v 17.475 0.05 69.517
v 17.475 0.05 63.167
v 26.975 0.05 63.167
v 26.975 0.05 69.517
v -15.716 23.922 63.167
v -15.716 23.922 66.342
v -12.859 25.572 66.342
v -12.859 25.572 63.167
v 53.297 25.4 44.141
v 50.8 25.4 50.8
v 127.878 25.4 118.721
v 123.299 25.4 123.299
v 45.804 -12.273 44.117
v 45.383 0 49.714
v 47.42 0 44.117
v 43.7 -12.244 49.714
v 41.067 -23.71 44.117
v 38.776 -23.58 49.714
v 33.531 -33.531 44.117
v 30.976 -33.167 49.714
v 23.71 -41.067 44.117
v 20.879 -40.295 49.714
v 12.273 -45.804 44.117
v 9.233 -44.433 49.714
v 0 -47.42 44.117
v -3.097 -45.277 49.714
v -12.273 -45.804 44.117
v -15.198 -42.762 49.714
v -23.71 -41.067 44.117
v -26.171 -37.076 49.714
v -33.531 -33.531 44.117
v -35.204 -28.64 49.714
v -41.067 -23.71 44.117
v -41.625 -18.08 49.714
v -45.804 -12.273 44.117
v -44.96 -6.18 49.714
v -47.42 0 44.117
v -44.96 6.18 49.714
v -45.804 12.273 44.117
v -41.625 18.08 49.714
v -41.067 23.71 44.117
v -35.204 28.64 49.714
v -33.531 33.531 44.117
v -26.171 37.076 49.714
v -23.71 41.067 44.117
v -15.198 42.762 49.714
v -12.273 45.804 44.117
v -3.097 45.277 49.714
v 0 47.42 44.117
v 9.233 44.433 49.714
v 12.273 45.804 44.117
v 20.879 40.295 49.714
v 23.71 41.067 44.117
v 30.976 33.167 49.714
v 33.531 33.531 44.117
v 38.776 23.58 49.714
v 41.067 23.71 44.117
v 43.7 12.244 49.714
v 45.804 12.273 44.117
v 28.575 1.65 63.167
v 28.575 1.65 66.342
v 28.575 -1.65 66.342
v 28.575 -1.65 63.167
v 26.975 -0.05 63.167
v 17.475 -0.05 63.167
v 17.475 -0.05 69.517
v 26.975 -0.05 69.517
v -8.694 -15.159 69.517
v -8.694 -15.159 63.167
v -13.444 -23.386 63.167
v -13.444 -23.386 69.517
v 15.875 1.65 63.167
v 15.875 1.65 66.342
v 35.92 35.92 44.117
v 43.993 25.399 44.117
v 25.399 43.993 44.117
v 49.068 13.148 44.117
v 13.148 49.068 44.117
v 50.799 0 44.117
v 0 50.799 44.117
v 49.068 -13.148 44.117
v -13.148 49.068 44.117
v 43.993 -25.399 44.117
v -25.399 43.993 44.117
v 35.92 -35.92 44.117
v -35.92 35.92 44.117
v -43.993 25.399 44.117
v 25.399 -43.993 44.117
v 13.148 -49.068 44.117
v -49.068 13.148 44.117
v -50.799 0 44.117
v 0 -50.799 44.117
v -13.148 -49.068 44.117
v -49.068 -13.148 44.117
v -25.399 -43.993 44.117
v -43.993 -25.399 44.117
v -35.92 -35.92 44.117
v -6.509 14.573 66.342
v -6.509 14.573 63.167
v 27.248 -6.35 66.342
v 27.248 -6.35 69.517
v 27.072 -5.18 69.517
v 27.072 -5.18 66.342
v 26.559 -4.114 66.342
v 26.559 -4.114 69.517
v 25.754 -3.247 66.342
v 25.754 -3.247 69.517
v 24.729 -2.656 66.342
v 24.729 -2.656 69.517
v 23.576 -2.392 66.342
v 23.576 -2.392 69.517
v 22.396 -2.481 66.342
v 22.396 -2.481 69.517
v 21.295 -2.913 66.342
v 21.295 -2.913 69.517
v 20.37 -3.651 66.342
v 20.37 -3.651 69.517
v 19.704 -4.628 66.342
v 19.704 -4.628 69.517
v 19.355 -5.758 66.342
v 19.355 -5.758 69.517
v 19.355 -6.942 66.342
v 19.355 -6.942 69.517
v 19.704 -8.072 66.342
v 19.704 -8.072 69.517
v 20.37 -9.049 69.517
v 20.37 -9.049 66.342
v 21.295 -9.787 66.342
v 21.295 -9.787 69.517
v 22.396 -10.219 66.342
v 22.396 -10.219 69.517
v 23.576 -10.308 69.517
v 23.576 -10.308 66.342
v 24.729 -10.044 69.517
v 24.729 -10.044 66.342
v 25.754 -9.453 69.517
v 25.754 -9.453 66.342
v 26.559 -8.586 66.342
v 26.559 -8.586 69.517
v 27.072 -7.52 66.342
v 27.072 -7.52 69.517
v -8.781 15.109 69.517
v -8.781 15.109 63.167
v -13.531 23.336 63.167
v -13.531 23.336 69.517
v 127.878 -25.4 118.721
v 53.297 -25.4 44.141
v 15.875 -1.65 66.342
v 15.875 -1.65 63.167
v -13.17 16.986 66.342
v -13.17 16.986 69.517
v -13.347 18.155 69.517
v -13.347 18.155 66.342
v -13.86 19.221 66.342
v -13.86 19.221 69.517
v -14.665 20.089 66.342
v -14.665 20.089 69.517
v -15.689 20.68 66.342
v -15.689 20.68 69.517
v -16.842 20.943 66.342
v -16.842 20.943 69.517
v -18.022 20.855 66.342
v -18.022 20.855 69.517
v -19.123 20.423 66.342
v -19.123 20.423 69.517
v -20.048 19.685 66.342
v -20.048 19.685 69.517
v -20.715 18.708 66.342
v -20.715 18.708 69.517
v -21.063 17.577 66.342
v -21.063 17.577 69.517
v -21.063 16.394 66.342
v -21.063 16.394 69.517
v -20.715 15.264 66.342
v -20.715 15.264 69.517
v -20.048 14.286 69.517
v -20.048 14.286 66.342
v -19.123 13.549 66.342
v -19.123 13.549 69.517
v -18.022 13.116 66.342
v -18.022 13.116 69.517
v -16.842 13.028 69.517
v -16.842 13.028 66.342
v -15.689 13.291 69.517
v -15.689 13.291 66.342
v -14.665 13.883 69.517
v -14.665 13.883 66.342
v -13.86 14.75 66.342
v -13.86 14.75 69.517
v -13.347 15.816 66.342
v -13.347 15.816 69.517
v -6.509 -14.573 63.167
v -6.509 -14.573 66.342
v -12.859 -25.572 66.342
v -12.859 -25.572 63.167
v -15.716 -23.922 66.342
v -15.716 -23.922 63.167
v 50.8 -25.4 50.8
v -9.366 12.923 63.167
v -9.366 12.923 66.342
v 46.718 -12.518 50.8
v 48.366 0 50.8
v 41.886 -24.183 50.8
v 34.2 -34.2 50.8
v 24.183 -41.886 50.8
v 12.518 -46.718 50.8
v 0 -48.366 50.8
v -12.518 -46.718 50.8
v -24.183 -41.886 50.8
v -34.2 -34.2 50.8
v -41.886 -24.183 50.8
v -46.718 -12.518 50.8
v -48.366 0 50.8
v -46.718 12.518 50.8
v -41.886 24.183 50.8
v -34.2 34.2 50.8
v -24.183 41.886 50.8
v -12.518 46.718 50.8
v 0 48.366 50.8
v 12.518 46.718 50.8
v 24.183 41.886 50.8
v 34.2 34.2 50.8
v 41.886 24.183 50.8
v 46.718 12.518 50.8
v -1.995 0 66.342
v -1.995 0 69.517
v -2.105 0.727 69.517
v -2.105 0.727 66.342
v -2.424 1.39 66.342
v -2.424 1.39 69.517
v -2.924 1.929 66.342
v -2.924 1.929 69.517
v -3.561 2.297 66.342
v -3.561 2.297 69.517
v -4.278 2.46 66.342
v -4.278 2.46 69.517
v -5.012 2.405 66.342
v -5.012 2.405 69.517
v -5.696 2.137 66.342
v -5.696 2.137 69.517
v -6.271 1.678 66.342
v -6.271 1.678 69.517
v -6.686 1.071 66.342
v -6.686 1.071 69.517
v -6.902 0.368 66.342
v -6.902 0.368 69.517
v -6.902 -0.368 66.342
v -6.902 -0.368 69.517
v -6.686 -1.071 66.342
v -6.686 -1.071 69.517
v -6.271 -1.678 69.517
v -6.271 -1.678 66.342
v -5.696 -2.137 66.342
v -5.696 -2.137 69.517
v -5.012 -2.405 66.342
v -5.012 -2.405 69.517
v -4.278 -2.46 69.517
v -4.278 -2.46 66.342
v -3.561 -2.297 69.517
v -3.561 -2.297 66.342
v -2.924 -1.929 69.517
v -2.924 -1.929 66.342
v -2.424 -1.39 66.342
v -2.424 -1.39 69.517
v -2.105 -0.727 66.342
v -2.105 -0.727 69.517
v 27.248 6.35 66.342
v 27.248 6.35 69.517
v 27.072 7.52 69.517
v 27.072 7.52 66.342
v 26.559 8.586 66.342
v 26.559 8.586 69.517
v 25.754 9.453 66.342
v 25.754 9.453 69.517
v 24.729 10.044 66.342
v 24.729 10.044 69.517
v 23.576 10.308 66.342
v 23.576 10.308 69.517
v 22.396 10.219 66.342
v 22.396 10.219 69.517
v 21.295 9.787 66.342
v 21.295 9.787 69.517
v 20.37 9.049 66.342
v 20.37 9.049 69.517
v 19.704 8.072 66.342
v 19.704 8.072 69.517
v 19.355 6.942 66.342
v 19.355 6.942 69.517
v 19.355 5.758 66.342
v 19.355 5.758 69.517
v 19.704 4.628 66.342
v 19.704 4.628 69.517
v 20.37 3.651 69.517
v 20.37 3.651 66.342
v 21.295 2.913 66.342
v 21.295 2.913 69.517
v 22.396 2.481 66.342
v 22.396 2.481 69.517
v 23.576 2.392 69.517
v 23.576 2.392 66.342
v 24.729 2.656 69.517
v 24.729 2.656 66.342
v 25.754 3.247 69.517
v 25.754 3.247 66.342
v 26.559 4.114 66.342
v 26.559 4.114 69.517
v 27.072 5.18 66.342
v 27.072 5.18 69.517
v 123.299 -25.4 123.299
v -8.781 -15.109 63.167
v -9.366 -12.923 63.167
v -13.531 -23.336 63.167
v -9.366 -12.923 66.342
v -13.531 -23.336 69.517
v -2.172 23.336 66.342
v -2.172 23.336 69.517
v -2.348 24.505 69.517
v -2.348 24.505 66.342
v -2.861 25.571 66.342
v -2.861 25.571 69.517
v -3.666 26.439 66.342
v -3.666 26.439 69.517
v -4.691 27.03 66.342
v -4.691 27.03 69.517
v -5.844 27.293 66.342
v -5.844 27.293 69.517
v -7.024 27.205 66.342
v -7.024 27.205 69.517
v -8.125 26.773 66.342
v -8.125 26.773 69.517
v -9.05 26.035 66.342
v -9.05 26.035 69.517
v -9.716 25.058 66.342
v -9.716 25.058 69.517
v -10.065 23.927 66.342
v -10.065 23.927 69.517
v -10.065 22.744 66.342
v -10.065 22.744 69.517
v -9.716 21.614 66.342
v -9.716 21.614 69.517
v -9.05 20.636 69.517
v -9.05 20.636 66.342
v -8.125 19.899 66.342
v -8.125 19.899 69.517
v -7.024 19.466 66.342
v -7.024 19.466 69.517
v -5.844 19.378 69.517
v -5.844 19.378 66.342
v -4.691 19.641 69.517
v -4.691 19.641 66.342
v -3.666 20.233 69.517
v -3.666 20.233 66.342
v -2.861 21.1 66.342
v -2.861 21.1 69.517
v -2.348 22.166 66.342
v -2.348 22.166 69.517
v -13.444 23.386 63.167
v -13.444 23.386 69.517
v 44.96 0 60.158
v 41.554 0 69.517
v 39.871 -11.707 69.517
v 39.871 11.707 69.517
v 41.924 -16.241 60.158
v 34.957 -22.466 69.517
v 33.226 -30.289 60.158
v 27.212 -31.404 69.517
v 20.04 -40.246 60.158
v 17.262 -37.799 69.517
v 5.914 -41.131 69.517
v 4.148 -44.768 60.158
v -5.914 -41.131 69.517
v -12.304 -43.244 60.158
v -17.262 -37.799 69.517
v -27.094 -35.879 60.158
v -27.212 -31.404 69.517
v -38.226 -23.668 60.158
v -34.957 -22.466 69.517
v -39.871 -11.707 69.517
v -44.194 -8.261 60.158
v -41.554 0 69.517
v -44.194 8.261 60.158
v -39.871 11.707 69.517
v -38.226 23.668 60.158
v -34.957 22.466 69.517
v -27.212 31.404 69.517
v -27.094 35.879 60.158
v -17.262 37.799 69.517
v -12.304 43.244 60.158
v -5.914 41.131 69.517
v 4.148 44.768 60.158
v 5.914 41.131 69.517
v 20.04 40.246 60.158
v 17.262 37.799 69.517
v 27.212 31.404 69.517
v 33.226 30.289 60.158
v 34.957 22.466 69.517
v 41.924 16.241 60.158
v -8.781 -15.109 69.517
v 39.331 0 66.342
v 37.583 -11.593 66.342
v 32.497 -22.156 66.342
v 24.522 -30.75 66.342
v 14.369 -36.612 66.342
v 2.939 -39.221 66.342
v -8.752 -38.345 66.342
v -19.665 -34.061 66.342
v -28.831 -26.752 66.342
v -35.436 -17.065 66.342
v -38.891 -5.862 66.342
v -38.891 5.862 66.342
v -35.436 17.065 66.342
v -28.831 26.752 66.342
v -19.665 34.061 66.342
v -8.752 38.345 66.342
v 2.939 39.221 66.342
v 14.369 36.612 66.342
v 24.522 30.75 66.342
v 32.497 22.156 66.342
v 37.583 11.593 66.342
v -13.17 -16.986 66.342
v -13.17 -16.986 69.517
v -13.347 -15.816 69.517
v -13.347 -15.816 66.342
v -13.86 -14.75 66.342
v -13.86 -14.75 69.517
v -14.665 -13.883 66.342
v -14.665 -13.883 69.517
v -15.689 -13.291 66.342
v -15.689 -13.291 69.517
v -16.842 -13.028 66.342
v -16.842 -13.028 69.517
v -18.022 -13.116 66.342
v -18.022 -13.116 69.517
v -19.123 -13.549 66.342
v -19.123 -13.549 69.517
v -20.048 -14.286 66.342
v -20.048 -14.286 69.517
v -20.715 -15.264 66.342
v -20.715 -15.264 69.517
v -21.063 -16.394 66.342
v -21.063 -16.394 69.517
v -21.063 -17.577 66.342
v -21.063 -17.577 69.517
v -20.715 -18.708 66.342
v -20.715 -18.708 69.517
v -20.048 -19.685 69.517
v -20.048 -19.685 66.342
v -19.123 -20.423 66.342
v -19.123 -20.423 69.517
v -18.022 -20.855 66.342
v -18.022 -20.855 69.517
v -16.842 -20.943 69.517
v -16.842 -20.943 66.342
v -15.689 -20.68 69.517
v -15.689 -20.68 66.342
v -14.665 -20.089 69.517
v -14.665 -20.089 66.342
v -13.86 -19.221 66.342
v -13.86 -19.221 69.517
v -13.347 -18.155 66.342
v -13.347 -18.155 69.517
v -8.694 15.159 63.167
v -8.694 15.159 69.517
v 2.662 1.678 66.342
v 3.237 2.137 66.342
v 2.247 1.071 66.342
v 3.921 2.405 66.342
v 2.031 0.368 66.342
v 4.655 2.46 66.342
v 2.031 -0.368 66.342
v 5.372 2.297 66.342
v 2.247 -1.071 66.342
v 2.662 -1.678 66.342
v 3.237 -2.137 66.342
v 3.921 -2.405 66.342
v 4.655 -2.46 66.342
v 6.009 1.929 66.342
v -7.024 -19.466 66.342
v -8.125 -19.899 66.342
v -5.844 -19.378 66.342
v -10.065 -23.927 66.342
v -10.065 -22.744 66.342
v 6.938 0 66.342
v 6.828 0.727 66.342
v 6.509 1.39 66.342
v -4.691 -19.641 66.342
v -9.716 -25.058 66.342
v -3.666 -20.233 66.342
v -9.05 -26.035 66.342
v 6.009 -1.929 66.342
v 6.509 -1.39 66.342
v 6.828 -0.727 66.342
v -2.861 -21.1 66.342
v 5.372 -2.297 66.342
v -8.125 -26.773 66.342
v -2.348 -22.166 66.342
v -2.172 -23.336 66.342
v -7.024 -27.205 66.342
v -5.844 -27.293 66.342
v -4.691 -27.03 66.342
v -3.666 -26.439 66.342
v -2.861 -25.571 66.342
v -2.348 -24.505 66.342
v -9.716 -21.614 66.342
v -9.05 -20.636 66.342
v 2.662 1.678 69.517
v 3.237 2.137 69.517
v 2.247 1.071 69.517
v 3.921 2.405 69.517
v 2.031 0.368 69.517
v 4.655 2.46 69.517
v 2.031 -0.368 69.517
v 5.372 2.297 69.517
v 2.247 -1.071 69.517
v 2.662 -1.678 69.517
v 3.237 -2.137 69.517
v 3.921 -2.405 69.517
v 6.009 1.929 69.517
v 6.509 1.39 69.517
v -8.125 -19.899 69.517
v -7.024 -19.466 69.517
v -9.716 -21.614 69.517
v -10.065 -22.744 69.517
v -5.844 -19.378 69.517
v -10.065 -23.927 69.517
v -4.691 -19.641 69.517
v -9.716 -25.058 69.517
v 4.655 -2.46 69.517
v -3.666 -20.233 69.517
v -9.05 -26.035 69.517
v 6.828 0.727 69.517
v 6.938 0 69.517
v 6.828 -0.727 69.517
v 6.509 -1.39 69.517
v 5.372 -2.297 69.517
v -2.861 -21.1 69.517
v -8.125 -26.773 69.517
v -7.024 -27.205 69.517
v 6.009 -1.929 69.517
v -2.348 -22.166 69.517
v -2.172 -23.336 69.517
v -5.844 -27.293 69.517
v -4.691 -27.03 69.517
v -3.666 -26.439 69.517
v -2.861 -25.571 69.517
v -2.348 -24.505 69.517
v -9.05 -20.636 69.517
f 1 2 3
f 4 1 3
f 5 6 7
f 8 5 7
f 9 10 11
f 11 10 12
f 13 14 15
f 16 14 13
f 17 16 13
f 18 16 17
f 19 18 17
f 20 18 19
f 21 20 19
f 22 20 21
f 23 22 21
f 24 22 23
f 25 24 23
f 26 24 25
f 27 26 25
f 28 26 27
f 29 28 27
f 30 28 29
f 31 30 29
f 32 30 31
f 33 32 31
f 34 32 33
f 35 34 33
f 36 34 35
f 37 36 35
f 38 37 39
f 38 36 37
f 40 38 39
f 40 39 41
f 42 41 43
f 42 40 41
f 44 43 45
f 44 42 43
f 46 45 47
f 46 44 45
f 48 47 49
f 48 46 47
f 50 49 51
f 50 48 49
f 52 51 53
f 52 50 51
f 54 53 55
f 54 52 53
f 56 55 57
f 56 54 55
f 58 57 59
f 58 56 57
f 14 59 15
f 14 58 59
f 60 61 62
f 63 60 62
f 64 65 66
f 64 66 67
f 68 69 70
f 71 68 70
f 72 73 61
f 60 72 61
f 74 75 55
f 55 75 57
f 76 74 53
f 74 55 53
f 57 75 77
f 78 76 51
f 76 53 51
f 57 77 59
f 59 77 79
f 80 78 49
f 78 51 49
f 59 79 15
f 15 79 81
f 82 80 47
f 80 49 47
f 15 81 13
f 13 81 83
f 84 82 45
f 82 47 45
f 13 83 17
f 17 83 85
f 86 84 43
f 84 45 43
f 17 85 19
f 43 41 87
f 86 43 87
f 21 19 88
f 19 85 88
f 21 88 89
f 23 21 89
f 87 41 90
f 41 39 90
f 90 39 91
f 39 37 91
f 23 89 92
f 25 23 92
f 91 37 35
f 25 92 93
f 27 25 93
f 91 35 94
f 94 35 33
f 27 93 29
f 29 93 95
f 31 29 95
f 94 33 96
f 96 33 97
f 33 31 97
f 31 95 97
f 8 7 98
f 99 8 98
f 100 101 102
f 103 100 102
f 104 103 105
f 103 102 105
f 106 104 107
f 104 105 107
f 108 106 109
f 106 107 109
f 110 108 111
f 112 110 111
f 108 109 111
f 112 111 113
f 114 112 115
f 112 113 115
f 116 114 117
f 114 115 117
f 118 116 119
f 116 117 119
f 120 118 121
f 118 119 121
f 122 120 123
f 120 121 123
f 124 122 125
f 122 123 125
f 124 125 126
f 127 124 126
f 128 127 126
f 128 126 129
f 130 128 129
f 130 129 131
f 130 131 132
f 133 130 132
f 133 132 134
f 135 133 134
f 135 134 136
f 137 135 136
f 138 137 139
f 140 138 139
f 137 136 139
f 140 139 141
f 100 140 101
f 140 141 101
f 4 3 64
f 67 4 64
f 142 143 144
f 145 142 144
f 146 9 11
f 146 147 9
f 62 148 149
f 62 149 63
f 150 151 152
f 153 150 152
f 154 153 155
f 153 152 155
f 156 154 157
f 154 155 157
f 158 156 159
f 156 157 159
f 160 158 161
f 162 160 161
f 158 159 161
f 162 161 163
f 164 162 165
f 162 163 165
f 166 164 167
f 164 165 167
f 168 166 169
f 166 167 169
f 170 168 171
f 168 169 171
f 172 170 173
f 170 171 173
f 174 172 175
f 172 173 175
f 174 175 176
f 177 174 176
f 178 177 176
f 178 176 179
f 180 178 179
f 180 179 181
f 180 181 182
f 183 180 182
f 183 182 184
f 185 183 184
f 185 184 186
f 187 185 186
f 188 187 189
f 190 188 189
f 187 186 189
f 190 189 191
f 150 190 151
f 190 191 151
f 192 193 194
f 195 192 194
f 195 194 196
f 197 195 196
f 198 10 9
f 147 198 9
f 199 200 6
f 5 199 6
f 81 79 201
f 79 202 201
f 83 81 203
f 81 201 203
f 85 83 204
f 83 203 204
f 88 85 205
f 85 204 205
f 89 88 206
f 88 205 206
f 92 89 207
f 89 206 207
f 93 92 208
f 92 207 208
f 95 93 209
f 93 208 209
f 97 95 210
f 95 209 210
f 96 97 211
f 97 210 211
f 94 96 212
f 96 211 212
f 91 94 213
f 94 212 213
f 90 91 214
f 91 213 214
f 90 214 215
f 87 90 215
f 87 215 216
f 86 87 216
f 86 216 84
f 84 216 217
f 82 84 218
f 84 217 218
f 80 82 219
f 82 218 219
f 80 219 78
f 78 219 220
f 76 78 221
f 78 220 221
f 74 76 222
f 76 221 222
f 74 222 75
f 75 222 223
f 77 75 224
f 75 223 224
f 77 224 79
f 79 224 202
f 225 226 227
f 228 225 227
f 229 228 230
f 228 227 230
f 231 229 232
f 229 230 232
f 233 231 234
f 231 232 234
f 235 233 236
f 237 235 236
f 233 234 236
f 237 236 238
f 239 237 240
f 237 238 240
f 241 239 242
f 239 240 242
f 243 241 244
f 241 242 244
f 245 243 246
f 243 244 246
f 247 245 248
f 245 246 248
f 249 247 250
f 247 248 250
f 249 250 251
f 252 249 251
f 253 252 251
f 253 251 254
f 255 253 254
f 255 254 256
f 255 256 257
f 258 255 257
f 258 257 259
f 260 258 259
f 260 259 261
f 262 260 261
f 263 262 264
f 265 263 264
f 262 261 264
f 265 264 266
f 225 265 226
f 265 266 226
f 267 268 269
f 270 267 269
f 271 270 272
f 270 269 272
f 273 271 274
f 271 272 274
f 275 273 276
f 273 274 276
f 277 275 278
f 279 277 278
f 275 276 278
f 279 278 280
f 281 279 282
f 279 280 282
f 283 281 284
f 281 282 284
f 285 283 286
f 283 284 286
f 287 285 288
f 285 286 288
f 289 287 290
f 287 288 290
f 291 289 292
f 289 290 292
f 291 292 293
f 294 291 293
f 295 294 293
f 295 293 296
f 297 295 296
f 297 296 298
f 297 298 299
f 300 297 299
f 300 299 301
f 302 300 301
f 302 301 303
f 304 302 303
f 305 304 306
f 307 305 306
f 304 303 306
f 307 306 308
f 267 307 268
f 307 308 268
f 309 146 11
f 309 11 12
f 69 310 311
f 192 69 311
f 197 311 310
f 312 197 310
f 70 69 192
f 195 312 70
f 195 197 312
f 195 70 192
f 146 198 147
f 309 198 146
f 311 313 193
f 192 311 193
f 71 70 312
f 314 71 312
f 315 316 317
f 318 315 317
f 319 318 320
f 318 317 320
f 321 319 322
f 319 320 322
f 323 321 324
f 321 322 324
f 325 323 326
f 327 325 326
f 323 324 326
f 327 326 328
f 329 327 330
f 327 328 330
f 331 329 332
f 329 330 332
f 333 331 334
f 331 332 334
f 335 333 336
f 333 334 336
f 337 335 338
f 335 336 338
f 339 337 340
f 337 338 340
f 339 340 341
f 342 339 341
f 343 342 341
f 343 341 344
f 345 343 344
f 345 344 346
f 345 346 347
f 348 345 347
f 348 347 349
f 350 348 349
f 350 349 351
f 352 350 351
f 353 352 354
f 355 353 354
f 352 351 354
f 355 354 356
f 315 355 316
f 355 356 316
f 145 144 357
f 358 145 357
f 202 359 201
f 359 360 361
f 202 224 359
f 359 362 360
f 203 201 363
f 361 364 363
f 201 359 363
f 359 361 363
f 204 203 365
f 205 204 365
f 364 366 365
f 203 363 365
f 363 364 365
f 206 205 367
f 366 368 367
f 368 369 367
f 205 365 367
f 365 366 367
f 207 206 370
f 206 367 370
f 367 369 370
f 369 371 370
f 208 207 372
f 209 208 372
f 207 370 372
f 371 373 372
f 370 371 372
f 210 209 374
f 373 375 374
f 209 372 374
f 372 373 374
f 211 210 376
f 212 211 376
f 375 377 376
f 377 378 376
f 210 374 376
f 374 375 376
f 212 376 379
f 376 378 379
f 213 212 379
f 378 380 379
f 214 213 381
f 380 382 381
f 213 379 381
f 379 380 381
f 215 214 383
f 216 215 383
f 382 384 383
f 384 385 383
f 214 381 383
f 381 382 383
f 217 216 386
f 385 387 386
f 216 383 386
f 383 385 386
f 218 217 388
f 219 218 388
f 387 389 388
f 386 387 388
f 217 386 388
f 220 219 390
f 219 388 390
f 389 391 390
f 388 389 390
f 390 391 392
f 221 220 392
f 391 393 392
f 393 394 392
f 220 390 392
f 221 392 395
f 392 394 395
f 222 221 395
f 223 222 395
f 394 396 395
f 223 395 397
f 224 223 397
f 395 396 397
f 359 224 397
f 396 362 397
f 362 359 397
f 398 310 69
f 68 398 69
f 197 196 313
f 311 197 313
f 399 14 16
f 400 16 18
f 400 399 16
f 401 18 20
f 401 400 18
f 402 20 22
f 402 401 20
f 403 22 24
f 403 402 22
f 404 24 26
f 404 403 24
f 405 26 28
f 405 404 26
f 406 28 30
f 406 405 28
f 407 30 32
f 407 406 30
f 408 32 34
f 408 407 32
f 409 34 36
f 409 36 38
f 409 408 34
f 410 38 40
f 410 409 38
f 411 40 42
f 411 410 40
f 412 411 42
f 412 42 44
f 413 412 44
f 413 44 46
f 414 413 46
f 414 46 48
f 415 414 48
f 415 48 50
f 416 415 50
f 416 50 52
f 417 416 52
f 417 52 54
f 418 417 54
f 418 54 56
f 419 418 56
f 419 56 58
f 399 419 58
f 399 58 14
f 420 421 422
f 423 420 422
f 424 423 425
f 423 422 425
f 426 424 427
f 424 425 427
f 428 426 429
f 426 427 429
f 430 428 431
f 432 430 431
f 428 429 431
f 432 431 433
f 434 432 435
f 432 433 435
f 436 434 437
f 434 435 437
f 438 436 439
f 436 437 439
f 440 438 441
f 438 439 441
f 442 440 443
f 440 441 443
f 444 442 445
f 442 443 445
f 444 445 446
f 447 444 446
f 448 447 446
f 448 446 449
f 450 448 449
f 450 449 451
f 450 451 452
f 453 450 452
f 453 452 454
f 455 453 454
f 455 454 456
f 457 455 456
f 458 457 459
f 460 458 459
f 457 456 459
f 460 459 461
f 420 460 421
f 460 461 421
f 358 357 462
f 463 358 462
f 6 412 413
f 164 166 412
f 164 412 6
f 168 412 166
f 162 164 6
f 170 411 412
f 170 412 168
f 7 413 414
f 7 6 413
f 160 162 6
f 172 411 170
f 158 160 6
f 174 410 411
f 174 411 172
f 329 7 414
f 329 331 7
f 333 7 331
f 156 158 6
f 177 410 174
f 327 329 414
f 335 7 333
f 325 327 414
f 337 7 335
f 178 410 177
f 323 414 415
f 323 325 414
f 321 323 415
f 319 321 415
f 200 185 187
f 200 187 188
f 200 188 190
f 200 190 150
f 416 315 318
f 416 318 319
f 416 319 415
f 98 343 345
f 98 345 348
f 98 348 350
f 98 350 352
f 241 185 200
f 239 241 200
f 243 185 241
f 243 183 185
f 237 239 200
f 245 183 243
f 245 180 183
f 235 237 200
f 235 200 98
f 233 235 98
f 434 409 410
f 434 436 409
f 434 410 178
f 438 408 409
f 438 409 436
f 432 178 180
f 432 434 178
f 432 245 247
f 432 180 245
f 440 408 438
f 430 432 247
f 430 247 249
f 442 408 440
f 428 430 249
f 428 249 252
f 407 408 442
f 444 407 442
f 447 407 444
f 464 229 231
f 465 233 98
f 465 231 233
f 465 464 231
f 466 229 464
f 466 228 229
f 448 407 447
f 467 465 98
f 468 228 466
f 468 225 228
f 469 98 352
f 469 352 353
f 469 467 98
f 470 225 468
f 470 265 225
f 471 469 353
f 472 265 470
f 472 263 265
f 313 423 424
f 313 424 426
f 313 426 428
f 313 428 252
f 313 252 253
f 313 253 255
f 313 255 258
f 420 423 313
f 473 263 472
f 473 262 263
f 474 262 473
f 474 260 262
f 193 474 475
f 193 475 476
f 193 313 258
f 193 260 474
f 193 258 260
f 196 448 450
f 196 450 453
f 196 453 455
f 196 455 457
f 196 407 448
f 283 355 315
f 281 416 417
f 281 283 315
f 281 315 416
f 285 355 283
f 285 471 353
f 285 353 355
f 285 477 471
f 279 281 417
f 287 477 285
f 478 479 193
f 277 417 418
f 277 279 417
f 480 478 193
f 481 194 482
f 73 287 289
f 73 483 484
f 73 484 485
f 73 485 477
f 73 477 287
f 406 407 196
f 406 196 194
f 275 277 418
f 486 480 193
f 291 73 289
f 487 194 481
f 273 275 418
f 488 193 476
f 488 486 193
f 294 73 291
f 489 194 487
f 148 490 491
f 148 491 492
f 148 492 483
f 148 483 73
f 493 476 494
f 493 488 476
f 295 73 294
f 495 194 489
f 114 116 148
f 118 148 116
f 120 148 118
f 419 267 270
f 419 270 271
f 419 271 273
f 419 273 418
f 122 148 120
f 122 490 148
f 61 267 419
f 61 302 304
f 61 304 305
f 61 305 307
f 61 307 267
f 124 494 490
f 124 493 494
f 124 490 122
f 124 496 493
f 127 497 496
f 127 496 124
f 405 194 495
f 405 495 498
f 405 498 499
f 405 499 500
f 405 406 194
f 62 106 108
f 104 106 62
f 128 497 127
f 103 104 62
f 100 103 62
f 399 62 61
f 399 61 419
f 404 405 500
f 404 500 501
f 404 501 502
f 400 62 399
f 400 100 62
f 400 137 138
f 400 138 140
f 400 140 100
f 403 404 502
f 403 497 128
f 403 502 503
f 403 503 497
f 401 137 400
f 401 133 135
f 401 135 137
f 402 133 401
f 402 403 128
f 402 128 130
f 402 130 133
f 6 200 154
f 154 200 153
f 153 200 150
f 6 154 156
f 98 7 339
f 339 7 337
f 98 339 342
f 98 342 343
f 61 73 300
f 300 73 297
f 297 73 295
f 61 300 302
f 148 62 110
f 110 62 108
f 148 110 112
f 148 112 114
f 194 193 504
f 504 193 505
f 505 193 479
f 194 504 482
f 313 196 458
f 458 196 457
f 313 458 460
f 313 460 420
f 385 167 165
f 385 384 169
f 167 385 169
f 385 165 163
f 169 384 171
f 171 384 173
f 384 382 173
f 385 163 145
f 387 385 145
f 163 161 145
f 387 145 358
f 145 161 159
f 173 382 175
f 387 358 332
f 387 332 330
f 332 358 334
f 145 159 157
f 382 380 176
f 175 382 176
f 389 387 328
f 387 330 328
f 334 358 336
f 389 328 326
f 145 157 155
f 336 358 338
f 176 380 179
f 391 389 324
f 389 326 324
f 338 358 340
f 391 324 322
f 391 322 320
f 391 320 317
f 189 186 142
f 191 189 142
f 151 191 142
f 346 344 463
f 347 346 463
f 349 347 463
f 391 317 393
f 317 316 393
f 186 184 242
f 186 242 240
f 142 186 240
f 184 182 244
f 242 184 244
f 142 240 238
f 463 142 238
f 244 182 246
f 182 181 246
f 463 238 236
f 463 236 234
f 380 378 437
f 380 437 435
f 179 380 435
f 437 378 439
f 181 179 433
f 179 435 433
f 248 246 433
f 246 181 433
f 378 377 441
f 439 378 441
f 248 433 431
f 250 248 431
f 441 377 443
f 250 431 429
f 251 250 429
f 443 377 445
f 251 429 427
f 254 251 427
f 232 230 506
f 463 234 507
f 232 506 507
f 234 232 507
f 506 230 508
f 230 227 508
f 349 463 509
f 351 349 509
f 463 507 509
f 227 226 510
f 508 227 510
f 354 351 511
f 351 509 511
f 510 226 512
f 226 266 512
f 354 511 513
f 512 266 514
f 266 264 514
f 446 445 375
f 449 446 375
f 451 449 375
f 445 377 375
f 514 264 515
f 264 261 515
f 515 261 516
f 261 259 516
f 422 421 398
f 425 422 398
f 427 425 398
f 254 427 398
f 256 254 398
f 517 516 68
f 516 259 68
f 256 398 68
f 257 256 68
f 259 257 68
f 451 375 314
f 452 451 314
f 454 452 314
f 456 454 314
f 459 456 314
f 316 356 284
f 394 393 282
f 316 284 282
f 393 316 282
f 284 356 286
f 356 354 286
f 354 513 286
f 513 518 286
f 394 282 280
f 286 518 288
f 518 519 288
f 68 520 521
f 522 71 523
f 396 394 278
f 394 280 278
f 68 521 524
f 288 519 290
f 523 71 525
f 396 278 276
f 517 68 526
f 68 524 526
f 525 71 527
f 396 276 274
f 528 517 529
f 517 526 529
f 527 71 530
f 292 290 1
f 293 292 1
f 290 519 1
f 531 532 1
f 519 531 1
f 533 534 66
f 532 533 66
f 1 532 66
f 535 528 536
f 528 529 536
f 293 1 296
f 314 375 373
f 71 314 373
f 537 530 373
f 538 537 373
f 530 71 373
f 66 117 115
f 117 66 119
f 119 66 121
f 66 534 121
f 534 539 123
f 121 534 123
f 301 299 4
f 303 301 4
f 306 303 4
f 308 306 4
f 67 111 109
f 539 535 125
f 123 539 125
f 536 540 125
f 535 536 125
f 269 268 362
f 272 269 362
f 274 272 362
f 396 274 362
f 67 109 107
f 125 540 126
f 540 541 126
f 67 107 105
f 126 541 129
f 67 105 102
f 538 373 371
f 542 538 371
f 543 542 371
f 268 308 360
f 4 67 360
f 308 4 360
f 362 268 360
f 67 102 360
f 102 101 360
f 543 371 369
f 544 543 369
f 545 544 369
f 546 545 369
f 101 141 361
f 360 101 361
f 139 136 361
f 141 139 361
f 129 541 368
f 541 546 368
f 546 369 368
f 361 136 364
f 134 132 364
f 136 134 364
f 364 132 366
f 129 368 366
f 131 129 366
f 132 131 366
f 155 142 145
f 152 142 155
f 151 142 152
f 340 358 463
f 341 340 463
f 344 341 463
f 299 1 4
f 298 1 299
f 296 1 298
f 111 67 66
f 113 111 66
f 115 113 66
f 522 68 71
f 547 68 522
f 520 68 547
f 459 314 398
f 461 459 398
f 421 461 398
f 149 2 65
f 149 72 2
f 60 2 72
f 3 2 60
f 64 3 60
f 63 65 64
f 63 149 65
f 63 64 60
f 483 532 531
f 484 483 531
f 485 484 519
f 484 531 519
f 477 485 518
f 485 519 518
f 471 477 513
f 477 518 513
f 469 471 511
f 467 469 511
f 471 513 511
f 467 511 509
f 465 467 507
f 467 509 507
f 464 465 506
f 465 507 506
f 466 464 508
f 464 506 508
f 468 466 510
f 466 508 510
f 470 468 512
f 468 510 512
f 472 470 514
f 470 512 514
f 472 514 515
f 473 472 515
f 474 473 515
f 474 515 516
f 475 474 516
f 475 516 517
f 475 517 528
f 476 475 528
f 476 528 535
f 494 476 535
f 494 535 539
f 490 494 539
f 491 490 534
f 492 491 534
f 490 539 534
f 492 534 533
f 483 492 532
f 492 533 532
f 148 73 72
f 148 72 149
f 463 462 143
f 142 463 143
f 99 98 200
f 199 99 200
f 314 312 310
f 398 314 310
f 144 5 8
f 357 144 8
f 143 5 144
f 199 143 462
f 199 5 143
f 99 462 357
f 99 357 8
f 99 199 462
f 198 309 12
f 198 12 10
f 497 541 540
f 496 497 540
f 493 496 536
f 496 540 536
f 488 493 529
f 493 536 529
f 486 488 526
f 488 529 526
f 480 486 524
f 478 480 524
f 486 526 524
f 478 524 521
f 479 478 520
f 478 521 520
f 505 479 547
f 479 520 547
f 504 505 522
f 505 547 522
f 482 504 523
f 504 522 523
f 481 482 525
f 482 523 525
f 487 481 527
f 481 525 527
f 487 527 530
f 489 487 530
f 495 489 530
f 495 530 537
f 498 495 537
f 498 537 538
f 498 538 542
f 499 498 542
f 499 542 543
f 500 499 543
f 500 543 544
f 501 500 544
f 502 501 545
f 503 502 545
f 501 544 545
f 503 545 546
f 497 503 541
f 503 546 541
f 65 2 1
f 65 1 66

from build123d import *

# Parameters (mm, degrees)
F3_DEPTH      = 25.4
F3_DEPTH_BACK = 25.4
F4_T          = -3.175
F5_R          = 2.4673149282
F6_DEPTH      = 3.175
F7_R          = 3.96875
F8_DEPTH      = 3.175
F9_W          = 12.7
F9_H          = 3.3
F10_DEPTH     = 3.175
F11_W         = 9.5
F11_H         = 0.1
F12_DEPTH     = 25.4


# Not quite as in the source:
# - a feature names something its author has since deleted; it is built from what else it names


with BuildPart() as f1:
    # F0 (on Front) → F1 (revolve)
    with BuildSketch(Plane.XZ):
        Polygon((48.3660958283, 50.8), (41.5537999286, 69.5166291593), (0, 69.5166291593), (0, 53.5741299391), (0, 44.1166291593), (50.7986438789, 44.1166291593), align=None)
    revolve(axis=Axis((0, 0, 26.7870649695), (0, 0, -1)))

    # F4
    f4_openings = [f1.faces().sort_by_distance(p)[0] for p in [
        (0, 0, 44.116629),
    ]]
    offset(amount=F4_T, openings=f4_openings)

    # F5 (on face) → F6 (cut, through all)
    with BuildSketch(Plane.XY.offset(69.5166291593)):
        with Locations((-4.462592816, 0)):
            Circle(F5_R)
        with Locations((4.4704, 0)):
            Circle(F5_R)
    extrude(amount=-F6_DEPTH, mode=Mode.SUBTRACT)

    # F7 (on face) → F8 (cut, through all)
    with BuildSketch(Plane.XY.offset(69.5166291593)):
        with Locations((-6.1404809512, -23.3356249903)):
            Circle(F7_R)
        with Locations((-17.1390035792, -16.9856249903)):
            Circle(F7_R)
        with Locations((-17.1390035792, 16.9856249903)):
            Circle(F7_R)
        with Locations((-6.1404809512, 23.3356249903)):
            Circle(F7_R)
        with Locations((23.2794845304, 6.35)):
            Circle(F7_R)
        with Locations((23.2794845304, -6.35)):
            Circle(F7_R)
    extrude(amount=-F8_DEPTH, mode=Mode.SUBTRACT)

    # F9 (on face) → F10 (join)
    with BuildSketch(Plane(origin=(0, 0, 66.3416291593), x_dir=(1, 0, 0), z_dir=(0, 0, -1))):
        with Locations((22.225, 0)):
            Rectangle(F9_W, F9_H)
        Polygon((-6.5085580838, 14.5731532851), (-12.8585580838, 25.5716759131), (-15.7164419162, 23.9216759131), (-9.3664419162, 12.9231532851), align=None)
        Polygon((-9.3664419162, -12.9231532851), (-15.7164419162, -23.9216759131), (-12.8585580838, -25.5716759131), (-6.5085580838, -14.5731532851), align=None)
    extrude(amount=F10_DEPTH)

    # F11 (on face) → F12 (cut)
    with BuildSketch(Plane(origin=(0, 0, 63.1666291593), x_dir=(1, 0, 0), z_dir=(0, 0, -1))):
        with Locations((22.225, 0)):
            Rectangle(F11_W, F11_H)
        Polygon((-8.7808012702, -15.1087939311), (-13.5308012702, -23.3360352671), (-13.4441987298, -23.3860352671), (-8.6941987298, -15.1587939311), align=None)
        Polygon((-8.6941987298, 15.1587939311), (-13.4441987298, 23.3860352671), (-13.5308012702, 23.3360352671), (-8.7808012702, 15.1087939311), align=None)
    extrude(amount=-F12_DEPTH, mode=Mode.SUBTRACT)


with BuildPart() as f3:
    # F2 (on Front) → F3 (new body, two sides)
    with BuildSketch(Plane.XZ) as f3_sk:
        Polygon((53.2972933905, 44.1405509586), (127.8775462373, 118.7208038053), (123.2991750213, 123.2991750213), (50.8, 50.8), align=None)
    extrude(amount=F3_DEPTH)
    extrude(f3_sk.sketch, amount=-F3_DEPTH_BACK)


solid = Compound([f1.part, f3.part])
